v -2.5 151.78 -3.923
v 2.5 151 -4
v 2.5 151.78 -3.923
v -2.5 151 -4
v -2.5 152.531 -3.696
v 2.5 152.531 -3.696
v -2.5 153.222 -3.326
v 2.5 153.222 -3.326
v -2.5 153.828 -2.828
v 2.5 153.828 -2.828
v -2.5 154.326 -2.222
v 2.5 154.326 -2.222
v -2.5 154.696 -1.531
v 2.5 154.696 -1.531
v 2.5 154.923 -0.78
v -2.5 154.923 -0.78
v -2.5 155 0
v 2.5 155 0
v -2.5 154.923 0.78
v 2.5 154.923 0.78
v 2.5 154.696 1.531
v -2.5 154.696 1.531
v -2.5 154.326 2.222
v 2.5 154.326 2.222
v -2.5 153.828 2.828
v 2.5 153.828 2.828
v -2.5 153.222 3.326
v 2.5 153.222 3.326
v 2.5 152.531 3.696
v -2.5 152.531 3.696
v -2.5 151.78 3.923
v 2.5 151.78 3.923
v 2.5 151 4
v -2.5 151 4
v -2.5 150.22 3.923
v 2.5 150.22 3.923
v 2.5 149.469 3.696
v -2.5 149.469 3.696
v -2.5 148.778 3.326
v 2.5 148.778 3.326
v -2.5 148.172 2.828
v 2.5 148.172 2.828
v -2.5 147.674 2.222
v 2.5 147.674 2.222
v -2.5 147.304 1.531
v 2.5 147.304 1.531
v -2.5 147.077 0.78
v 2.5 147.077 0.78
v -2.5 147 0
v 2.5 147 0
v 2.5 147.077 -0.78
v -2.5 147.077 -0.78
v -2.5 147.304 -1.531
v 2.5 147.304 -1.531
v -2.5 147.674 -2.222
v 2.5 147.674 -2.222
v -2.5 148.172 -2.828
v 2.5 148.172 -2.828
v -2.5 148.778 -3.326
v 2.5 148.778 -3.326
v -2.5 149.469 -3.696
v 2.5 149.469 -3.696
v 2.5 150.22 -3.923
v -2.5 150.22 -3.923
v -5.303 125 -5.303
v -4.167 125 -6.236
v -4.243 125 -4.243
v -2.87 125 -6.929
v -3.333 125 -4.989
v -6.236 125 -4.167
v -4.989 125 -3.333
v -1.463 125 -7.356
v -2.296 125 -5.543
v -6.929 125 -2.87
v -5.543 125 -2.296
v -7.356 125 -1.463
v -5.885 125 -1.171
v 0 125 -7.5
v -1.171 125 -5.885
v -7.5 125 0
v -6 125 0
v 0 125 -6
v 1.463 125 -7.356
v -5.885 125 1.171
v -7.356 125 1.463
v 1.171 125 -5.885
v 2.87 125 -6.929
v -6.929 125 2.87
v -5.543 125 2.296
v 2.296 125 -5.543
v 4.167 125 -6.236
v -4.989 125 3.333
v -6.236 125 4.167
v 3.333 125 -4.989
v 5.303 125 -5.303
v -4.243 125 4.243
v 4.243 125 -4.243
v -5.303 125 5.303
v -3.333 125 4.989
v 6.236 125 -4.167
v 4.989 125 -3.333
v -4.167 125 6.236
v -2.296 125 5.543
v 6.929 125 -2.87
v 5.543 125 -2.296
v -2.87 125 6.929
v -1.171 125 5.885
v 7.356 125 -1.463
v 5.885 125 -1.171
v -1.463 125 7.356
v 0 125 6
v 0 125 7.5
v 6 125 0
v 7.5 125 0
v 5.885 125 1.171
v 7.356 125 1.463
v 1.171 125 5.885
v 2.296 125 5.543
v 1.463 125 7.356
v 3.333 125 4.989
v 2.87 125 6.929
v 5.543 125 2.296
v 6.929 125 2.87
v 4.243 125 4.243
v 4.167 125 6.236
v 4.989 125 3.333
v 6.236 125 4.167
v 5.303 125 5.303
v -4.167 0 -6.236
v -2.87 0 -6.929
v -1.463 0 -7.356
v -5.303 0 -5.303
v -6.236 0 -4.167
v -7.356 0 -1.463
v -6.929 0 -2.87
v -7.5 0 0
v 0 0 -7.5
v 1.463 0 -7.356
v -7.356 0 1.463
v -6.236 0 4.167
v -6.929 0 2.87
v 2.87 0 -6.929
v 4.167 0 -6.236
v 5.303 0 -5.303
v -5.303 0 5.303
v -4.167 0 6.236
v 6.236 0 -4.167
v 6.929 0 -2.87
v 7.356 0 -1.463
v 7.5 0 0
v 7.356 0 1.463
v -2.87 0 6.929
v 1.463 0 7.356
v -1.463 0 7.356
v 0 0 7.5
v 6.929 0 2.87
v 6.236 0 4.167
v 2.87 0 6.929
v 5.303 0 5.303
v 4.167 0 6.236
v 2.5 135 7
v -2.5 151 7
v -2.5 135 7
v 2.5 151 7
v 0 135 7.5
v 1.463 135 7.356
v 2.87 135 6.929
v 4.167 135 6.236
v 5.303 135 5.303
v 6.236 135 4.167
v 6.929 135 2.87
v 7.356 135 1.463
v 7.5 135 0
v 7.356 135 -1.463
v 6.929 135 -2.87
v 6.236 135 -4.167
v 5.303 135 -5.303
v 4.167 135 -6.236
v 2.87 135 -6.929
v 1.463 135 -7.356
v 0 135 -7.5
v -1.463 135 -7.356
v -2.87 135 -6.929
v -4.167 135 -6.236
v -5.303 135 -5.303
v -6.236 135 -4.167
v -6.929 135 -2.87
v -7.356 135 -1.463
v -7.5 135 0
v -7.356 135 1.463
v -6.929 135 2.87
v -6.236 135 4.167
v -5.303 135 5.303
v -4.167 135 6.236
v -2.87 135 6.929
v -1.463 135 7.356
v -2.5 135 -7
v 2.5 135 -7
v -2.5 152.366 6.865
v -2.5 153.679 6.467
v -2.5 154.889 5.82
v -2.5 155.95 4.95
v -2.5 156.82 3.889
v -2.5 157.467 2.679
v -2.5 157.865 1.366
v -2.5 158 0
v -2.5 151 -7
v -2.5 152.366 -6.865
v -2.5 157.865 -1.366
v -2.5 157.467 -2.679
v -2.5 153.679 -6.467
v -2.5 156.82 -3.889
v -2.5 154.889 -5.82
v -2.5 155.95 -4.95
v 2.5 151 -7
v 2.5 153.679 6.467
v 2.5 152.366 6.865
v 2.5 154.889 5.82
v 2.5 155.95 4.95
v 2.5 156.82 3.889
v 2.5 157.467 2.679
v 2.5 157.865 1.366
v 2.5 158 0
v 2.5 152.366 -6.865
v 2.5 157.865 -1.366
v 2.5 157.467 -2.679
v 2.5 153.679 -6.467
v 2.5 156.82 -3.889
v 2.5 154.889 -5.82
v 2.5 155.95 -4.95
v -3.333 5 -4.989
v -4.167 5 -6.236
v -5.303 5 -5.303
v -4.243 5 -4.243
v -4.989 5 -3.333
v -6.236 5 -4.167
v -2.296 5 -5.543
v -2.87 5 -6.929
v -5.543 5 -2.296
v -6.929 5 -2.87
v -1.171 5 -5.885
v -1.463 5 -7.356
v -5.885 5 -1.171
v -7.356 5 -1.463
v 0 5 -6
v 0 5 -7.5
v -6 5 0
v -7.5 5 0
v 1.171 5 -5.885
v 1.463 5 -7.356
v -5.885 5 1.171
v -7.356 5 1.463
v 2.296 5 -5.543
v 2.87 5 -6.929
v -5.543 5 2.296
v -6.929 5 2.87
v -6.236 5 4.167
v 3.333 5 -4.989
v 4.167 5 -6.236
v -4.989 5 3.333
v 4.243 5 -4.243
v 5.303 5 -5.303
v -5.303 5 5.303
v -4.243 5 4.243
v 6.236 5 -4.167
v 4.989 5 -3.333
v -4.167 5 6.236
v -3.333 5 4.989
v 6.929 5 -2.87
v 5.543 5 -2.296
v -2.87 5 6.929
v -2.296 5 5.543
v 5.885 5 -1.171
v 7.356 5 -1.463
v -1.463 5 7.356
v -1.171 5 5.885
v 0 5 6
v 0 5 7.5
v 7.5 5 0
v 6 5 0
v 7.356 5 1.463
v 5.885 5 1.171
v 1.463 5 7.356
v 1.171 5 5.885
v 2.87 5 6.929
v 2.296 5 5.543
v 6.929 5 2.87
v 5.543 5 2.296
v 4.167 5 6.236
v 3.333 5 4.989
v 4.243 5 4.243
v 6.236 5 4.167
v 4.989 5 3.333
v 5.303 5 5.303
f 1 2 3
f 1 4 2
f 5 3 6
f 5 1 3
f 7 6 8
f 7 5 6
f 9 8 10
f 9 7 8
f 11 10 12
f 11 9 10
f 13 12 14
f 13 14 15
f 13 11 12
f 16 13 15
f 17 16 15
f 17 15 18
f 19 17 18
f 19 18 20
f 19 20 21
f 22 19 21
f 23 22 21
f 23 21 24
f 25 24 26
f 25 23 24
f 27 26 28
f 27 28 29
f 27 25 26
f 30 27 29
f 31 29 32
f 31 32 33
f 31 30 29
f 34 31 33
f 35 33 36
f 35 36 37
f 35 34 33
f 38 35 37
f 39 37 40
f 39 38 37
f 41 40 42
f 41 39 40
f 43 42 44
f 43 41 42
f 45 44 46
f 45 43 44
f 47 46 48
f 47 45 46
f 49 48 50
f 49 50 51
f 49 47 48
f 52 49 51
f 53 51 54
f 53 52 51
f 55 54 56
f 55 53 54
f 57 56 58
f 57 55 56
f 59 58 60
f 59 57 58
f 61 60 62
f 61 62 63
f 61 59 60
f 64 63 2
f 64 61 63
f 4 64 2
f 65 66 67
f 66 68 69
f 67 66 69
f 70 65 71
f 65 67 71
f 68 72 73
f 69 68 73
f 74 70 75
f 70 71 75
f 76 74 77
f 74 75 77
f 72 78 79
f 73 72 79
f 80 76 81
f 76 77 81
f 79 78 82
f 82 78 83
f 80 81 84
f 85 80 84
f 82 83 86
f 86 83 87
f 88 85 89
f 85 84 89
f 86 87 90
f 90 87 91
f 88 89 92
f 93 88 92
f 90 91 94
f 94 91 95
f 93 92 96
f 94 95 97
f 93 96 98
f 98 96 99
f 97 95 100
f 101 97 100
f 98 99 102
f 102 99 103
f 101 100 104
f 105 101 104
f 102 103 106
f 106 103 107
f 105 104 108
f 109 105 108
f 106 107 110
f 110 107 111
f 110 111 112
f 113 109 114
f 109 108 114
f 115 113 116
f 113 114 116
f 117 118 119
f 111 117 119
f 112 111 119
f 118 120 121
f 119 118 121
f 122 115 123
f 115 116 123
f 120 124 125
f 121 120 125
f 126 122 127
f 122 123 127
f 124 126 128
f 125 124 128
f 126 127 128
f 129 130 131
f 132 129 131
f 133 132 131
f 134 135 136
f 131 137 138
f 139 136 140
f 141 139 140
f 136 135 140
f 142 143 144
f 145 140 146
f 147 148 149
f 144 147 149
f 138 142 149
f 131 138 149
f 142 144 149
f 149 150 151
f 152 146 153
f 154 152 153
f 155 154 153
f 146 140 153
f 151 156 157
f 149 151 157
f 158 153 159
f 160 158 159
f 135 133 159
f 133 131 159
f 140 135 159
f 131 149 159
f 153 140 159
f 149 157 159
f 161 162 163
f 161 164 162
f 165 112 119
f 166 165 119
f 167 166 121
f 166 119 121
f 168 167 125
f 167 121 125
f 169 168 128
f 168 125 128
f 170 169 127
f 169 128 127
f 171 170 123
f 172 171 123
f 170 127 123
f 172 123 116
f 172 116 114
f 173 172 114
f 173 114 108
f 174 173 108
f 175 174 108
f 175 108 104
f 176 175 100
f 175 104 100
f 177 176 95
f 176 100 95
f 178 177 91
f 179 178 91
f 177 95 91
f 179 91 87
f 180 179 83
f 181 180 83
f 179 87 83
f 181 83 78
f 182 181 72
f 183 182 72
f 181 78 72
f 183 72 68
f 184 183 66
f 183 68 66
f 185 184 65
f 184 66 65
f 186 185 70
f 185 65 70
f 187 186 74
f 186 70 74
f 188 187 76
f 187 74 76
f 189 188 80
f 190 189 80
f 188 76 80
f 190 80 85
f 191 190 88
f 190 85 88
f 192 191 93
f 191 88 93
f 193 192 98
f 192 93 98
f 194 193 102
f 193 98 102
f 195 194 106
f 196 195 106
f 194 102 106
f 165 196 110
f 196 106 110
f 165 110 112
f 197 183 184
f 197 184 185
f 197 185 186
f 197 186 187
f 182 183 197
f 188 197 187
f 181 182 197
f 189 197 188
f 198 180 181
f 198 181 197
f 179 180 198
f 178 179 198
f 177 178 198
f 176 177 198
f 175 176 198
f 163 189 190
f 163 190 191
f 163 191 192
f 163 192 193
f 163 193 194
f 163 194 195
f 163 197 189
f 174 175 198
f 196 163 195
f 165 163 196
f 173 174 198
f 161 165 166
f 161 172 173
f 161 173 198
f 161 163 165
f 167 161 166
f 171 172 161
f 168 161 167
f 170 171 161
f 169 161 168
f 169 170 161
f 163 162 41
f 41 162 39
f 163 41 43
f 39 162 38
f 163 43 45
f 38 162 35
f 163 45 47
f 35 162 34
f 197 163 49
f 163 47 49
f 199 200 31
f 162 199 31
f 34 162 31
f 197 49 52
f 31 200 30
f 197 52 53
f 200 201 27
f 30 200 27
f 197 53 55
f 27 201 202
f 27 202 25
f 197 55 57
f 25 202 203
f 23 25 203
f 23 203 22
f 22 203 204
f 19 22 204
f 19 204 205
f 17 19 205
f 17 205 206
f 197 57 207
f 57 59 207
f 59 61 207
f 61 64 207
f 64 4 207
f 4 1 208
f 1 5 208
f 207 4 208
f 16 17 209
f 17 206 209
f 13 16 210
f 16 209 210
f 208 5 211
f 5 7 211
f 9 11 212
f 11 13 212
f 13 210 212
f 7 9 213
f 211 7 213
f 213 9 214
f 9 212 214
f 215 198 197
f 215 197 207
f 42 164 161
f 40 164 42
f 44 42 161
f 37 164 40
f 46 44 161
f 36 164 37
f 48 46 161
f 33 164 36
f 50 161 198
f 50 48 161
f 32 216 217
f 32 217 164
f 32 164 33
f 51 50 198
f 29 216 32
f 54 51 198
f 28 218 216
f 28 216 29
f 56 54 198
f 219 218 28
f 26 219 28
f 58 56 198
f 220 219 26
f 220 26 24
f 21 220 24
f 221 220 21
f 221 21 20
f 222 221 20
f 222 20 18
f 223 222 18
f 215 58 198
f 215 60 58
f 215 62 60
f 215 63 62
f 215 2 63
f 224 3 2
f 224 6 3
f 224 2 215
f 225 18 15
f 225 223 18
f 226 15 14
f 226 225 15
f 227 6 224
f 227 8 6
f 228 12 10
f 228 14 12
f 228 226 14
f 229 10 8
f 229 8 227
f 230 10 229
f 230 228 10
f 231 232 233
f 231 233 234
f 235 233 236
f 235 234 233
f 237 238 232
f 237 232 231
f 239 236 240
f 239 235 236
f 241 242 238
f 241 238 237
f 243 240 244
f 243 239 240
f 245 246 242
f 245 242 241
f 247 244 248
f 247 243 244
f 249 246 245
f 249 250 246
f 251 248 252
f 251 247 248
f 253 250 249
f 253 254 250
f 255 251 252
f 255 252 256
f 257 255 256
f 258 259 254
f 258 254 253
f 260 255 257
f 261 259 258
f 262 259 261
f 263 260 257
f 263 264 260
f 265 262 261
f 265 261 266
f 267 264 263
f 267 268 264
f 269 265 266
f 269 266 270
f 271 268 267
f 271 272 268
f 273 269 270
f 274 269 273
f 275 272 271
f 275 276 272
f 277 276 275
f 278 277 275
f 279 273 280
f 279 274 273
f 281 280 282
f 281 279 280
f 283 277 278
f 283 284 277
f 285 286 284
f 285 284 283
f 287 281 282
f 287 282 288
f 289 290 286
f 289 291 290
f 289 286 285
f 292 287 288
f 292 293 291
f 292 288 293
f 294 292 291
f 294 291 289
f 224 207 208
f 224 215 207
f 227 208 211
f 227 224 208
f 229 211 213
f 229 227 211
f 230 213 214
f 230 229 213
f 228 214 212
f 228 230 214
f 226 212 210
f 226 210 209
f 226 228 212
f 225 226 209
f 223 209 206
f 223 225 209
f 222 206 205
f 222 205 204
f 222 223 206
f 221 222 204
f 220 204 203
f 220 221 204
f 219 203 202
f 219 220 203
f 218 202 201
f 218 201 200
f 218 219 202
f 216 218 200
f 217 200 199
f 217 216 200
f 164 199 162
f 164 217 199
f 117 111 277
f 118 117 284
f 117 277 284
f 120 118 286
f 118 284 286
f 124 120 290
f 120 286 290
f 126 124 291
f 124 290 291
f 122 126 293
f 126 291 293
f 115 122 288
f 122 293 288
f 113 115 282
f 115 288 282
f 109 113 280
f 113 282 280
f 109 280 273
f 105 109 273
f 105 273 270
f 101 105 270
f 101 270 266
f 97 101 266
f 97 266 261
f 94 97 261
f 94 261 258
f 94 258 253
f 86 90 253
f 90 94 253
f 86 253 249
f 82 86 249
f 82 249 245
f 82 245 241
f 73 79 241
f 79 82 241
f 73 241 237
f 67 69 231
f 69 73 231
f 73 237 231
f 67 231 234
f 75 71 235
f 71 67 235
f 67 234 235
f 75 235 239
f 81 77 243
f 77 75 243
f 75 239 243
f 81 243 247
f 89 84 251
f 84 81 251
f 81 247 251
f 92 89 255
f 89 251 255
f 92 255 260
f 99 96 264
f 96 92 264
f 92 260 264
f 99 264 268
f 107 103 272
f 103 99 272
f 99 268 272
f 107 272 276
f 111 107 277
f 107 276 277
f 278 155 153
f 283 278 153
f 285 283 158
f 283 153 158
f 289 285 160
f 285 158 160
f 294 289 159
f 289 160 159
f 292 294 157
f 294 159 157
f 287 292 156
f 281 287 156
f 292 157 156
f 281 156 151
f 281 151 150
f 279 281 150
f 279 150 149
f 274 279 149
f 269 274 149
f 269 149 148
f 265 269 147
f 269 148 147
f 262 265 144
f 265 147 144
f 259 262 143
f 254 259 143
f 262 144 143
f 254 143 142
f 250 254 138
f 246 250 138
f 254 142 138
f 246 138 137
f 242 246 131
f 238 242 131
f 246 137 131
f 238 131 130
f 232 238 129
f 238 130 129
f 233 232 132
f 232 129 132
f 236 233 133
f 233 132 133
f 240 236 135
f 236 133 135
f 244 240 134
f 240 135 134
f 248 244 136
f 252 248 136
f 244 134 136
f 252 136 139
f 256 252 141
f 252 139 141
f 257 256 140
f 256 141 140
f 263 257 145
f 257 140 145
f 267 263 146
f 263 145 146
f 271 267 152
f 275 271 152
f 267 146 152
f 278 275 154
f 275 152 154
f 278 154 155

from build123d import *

# Parameters (mm, degrees)
SKETCH_1_R      = 7.5
EXTRUDE_1_DEPTH = 5
SKETCH_2_R      = 6
EXTRUDE_2_DEPTH = 130
SKETCH_3_R      = 4
EXTRUDE_3_DEPTH = 2.5
EXTRUDE_START   = -10
SKETCH_4_R      = 7.5
EXTRUDE_4_DEPTH = 10


with BuildPart() as part:
    # 草圖1 → 填料-伸長1 (new body)
    with BuildSketch(Plane(origin=(0, 0, 0), x_dir=(1, 0, 0), z_dir=(0, 1, 0))):
        with Locations(Location((0, 0, 0), (0, 0, 270))):
            Circle(SKETCH_1_R)
    extrude(amount=EXTRUDE_1_DEPTH)

    # 草圖2 → 填料-伸長2 (add)
    with BuildSketch(Plane(origin=(0, 5, 0), x_dir=(1, 0, 0), z_dir=(0, 1, 0))):
        with Locations(Location((0, 0, 0), (0, 0, 270))):
            Circle(SKETCH_2_R)
    extrude(amount=EXTRUDE_2_DEPTH)

    # 草圖3 → 填料-伸長3 (add, symmetric)
    with BuildSketch(Plane(origin=(0, 0, 0), x_dir=(0, 0, -1), z_dir=(1, 0, 0))):
        with BuildLine():
            Line((-7, 151), (-7, 135))
            Line((-7, 135), (7, 135))
            Line((7, 135), (7, 151))
            ThreePointArc((7, 151), (0, 158), (-7, 151))
        make_face()
        with Locations((0, 151)):
            Circle(SKETCH_3_R, mode=Mode.SUBTRACT)
    extrude(amount=EXTRUDE_3_DEPTH, both=True)

    # 草圖4 → 填料-伸長4 (add)
    with BuildSketch(Plane(origin=(0, 135, 0), x_dir=(1, 0, 0), z_dir=(0, 1, 0)).offset(EXTRUDE_START)):
        with Locations(Location((0, 0, 0), (0, 0, 270))):
            Circle(SKETCH_4_R)
    extrude(amount=EXTRUDE_4_DEPTH)


solid = part.part
